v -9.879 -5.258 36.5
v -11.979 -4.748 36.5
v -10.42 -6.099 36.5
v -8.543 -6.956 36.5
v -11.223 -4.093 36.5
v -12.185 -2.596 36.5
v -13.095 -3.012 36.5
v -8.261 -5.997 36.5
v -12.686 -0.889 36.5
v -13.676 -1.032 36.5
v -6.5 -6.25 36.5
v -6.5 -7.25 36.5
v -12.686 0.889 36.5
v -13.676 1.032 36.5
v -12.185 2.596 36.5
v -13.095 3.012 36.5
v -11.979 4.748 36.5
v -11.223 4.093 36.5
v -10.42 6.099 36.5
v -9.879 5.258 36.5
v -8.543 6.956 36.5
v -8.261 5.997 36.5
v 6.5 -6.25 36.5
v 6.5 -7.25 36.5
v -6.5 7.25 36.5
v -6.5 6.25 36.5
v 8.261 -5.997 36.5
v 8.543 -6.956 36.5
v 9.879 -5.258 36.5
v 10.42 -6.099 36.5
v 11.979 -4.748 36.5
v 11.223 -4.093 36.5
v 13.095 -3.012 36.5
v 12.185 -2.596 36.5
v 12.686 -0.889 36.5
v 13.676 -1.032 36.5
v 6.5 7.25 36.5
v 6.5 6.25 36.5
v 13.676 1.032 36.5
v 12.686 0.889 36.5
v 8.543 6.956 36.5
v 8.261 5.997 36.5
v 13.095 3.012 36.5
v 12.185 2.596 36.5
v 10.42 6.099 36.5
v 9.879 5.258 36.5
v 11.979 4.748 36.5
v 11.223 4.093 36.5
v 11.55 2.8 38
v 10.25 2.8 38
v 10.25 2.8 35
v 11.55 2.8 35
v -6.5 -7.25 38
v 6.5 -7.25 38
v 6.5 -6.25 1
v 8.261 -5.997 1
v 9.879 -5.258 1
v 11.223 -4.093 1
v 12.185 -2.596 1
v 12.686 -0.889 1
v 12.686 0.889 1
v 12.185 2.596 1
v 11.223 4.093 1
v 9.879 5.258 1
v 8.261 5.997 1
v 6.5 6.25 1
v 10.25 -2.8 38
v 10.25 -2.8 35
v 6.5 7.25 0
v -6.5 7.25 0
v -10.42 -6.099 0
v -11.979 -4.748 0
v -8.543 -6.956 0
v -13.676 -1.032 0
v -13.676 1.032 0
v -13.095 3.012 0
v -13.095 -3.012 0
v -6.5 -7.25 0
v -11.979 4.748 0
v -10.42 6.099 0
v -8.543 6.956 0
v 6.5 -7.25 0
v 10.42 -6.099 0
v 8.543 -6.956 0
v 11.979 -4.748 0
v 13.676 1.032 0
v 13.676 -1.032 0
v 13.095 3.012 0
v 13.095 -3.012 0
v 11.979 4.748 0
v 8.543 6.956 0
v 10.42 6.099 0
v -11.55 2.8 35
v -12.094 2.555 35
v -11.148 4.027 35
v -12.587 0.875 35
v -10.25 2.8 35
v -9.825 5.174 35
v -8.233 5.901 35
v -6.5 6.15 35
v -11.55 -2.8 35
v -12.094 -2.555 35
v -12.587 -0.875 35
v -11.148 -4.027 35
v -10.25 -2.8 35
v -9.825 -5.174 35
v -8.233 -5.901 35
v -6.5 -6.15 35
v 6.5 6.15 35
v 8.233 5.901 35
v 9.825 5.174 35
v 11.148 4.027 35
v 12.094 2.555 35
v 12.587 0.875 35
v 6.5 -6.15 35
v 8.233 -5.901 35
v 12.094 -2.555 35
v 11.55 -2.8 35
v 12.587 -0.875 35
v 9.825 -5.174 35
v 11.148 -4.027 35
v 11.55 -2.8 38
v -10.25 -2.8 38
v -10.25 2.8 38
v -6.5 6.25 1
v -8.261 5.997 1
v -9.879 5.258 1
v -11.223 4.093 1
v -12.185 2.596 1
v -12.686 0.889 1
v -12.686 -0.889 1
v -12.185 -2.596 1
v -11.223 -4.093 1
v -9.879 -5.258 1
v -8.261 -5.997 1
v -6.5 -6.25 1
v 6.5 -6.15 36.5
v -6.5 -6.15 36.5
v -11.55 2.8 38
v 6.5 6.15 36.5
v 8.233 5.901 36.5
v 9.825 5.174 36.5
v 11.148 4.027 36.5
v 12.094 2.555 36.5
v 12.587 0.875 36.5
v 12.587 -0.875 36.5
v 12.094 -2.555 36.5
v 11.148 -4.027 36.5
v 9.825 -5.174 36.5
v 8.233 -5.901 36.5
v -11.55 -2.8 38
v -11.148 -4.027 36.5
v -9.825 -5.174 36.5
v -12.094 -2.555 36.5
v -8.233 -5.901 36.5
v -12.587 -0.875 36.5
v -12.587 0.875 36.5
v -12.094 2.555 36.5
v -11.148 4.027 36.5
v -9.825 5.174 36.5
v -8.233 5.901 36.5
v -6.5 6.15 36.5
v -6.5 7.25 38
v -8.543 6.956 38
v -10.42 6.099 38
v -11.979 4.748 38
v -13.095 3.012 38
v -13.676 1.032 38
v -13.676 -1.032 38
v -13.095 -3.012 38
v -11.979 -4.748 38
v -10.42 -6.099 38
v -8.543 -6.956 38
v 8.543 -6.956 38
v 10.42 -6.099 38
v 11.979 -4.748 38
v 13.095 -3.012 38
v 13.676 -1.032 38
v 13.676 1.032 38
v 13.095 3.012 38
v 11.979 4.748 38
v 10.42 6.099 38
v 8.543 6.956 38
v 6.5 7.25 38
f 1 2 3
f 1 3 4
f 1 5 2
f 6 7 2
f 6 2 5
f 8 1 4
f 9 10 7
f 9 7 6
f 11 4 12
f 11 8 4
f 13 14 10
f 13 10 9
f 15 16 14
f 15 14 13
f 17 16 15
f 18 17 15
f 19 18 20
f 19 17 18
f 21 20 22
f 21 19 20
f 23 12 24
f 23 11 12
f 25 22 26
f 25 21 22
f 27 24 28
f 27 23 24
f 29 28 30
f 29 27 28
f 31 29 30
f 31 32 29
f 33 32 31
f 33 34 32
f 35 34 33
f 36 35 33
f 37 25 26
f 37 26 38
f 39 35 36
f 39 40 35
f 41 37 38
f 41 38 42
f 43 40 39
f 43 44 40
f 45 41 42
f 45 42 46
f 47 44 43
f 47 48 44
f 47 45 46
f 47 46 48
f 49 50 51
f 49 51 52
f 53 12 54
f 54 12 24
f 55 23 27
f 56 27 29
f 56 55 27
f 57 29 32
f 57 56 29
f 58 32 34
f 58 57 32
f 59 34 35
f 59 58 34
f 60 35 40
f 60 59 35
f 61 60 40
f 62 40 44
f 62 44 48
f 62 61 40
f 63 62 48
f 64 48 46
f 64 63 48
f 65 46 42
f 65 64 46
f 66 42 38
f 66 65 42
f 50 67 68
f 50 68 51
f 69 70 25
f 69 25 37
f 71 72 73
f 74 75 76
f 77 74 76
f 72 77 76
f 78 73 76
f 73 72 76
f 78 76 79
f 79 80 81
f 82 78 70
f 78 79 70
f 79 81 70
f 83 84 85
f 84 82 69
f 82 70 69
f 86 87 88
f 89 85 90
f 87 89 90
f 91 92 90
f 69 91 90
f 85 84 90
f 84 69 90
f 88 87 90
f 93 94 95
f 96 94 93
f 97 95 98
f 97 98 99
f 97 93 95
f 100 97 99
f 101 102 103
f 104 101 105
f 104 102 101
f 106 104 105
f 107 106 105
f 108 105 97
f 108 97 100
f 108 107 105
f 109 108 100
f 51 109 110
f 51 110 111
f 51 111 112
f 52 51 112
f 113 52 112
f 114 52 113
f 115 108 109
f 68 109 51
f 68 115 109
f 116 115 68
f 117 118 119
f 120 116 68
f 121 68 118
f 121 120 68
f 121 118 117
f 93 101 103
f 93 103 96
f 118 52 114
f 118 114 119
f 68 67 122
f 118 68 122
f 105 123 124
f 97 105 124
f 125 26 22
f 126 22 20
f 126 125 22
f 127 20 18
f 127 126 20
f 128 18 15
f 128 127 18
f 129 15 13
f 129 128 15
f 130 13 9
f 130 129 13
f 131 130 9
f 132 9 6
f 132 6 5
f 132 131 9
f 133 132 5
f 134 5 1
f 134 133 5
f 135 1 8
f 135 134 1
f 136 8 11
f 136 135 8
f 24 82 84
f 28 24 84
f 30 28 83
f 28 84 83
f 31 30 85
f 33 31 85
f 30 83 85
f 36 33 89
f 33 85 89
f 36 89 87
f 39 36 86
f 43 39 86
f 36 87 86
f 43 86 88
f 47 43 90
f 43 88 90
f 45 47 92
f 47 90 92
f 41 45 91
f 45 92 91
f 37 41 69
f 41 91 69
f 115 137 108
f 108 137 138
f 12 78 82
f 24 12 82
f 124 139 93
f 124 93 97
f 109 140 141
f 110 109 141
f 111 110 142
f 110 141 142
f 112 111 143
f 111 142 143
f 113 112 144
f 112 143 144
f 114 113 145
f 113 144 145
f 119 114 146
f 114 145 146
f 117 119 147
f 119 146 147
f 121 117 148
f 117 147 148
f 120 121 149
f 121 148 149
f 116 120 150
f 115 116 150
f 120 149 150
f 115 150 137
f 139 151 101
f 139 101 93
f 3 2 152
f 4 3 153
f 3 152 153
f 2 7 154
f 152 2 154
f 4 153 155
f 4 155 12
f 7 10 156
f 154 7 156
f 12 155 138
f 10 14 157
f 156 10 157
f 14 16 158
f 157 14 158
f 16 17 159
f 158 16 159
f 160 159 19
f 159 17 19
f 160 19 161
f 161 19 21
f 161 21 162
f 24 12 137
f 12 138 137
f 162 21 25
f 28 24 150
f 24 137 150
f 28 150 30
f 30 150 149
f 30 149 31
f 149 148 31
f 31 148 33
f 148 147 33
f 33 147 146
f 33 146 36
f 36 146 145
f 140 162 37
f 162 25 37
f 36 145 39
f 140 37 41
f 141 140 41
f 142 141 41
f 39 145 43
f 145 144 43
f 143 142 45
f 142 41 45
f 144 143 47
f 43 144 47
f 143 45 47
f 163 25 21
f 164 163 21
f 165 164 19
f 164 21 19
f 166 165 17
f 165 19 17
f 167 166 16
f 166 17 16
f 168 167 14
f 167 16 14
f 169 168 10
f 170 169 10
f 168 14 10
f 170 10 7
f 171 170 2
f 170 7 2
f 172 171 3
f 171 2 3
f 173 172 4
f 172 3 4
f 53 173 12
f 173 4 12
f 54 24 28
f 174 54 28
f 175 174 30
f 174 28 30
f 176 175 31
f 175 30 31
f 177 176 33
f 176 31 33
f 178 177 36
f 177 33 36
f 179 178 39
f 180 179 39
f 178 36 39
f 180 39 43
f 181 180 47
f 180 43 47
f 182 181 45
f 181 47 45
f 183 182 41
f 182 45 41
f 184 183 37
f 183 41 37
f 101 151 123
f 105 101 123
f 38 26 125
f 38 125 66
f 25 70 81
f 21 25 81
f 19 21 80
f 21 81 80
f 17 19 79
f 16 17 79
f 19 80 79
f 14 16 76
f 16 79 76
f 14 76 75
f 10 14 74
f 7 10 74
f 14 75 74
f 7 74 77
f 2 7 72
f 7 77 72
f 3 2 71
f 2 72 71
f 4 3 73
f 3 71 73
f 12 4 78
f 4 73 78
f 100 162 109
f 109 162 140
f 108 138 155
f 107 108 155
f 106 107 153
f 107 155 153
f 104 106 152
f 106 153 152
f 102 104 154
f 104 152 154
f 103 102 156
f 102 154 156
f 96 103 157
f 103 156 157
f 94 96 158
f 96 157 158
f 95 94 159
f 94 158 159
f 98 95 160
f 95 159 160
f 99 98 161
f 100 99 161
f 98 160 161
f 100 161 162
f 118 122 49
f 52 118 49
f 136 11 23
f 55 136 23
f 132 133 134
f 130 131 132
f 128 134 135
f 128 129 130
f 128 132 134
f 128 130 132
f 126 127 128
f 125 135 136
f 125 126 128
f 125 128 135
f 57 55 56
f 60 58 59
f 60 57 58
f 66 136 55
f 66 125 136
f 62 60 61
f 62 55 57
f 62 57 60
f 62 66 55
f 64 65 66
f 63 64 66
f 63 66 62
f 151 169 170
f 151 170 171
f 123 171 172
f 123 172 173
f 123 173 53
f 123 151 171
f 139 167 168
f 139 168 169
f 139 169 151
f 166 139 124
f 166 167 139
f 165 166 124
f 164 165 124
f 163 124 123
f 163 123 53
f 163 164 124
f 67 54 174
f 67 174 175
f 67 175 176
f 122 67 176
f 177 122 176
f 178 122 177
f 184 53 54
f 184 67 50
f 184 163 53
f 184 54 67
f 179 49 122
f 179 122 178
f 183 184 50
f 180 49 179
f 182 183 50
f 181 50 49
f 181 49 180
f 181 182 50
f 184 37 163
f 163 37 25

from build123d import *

# Parameters (mm, degrees)
F0_W     = 13
F0_H     = 14.5
F1_DEPTH = 36.5
F2_T     = -1
F4_DEPTH = 1.5
F6_DEPTH = 1.5
F7_W     = 1.3
F7_H     = 5.6
F8_DEPTH = 3


with BuildPart() as f1:
    # F0 (on Top) → F1 (new body)
    with BuildSketch(Plane.XY):
        Rectangle(F0_W, F0_H)
        with BuildLine():
            Line((6.5, 7.25), (6.5, -7.25))
            ThreePointArc((6.5, -7.25), (13.75, 0), (6.5, 7.25))
        make_face()
        with BuildLine():
            ThreePointArc((-6.5, 7.25), (-13.75, 0), (-6.5, -7.25))
            Line((-6.5, -7.25), (-6.5, 7.25))
        make_face()
    extrude(amount=F1_DEPTH)

    # F2
    f2_openings = [f1.faces().sort_by_distance(p)[0] for p in [
        (0, 0, 36.5),
    ]]
    offset(amount=F2_T, openings=f2_openings)


with BuildPart() as f4:
    # F3 (on face) → F4 (new body)
    with BuildSketch(Plane.XY.offset(36.5)):
        with BuildLine():
            Line((-6.5, -7.25), (6.5, -7.25))
            ThreePointArc((6.5, -7.25), (13.75, 0), (6.5, 7.25))
            Line((6.5, 7.25), (-6.5, 7.25))
            ThreePointArc((-6.5, 7.25), (-13.75, 0), (-6.5, -7.25))
        make_face()
    extrude(amount=F4_DEPTH)

    # F5 (on face) → F6 (join)
    with BuildSketch(Plane(origin=(0, 0, 36.5), x_dir=(1, 0, 0), z_dir=(0, 0, -1))):
        with BuildLine():
            ThreePointArc((-6.5, 6.15), (-12.65, 0), (-6.5, -6.15))
            Line((-6.5, -6.15), (6.5, -6.15))
            ThreePointArc((6.5, -6.15), (12.65, 0), (6.5, 6.15))
            Line((6.5, 6.15), (-6.5, 6.15))
        make_face()
    extrude(amount=F6_DEPTH)

    # F7 (on face) → F8 (cut)
    with BuildSketch(Plane.XY.offset(38)):
        with Locations((-10.9, 0)):
            Rectangle(F7_W, F7_H)
        with Locations((10.9, 0)):
            Rectangle(F7_W, F7_H)
    extrude(amount=-F8_DEPTH, mode=Mode.SUBTRACT)


solid = Compound([f1.part, f4.part])
